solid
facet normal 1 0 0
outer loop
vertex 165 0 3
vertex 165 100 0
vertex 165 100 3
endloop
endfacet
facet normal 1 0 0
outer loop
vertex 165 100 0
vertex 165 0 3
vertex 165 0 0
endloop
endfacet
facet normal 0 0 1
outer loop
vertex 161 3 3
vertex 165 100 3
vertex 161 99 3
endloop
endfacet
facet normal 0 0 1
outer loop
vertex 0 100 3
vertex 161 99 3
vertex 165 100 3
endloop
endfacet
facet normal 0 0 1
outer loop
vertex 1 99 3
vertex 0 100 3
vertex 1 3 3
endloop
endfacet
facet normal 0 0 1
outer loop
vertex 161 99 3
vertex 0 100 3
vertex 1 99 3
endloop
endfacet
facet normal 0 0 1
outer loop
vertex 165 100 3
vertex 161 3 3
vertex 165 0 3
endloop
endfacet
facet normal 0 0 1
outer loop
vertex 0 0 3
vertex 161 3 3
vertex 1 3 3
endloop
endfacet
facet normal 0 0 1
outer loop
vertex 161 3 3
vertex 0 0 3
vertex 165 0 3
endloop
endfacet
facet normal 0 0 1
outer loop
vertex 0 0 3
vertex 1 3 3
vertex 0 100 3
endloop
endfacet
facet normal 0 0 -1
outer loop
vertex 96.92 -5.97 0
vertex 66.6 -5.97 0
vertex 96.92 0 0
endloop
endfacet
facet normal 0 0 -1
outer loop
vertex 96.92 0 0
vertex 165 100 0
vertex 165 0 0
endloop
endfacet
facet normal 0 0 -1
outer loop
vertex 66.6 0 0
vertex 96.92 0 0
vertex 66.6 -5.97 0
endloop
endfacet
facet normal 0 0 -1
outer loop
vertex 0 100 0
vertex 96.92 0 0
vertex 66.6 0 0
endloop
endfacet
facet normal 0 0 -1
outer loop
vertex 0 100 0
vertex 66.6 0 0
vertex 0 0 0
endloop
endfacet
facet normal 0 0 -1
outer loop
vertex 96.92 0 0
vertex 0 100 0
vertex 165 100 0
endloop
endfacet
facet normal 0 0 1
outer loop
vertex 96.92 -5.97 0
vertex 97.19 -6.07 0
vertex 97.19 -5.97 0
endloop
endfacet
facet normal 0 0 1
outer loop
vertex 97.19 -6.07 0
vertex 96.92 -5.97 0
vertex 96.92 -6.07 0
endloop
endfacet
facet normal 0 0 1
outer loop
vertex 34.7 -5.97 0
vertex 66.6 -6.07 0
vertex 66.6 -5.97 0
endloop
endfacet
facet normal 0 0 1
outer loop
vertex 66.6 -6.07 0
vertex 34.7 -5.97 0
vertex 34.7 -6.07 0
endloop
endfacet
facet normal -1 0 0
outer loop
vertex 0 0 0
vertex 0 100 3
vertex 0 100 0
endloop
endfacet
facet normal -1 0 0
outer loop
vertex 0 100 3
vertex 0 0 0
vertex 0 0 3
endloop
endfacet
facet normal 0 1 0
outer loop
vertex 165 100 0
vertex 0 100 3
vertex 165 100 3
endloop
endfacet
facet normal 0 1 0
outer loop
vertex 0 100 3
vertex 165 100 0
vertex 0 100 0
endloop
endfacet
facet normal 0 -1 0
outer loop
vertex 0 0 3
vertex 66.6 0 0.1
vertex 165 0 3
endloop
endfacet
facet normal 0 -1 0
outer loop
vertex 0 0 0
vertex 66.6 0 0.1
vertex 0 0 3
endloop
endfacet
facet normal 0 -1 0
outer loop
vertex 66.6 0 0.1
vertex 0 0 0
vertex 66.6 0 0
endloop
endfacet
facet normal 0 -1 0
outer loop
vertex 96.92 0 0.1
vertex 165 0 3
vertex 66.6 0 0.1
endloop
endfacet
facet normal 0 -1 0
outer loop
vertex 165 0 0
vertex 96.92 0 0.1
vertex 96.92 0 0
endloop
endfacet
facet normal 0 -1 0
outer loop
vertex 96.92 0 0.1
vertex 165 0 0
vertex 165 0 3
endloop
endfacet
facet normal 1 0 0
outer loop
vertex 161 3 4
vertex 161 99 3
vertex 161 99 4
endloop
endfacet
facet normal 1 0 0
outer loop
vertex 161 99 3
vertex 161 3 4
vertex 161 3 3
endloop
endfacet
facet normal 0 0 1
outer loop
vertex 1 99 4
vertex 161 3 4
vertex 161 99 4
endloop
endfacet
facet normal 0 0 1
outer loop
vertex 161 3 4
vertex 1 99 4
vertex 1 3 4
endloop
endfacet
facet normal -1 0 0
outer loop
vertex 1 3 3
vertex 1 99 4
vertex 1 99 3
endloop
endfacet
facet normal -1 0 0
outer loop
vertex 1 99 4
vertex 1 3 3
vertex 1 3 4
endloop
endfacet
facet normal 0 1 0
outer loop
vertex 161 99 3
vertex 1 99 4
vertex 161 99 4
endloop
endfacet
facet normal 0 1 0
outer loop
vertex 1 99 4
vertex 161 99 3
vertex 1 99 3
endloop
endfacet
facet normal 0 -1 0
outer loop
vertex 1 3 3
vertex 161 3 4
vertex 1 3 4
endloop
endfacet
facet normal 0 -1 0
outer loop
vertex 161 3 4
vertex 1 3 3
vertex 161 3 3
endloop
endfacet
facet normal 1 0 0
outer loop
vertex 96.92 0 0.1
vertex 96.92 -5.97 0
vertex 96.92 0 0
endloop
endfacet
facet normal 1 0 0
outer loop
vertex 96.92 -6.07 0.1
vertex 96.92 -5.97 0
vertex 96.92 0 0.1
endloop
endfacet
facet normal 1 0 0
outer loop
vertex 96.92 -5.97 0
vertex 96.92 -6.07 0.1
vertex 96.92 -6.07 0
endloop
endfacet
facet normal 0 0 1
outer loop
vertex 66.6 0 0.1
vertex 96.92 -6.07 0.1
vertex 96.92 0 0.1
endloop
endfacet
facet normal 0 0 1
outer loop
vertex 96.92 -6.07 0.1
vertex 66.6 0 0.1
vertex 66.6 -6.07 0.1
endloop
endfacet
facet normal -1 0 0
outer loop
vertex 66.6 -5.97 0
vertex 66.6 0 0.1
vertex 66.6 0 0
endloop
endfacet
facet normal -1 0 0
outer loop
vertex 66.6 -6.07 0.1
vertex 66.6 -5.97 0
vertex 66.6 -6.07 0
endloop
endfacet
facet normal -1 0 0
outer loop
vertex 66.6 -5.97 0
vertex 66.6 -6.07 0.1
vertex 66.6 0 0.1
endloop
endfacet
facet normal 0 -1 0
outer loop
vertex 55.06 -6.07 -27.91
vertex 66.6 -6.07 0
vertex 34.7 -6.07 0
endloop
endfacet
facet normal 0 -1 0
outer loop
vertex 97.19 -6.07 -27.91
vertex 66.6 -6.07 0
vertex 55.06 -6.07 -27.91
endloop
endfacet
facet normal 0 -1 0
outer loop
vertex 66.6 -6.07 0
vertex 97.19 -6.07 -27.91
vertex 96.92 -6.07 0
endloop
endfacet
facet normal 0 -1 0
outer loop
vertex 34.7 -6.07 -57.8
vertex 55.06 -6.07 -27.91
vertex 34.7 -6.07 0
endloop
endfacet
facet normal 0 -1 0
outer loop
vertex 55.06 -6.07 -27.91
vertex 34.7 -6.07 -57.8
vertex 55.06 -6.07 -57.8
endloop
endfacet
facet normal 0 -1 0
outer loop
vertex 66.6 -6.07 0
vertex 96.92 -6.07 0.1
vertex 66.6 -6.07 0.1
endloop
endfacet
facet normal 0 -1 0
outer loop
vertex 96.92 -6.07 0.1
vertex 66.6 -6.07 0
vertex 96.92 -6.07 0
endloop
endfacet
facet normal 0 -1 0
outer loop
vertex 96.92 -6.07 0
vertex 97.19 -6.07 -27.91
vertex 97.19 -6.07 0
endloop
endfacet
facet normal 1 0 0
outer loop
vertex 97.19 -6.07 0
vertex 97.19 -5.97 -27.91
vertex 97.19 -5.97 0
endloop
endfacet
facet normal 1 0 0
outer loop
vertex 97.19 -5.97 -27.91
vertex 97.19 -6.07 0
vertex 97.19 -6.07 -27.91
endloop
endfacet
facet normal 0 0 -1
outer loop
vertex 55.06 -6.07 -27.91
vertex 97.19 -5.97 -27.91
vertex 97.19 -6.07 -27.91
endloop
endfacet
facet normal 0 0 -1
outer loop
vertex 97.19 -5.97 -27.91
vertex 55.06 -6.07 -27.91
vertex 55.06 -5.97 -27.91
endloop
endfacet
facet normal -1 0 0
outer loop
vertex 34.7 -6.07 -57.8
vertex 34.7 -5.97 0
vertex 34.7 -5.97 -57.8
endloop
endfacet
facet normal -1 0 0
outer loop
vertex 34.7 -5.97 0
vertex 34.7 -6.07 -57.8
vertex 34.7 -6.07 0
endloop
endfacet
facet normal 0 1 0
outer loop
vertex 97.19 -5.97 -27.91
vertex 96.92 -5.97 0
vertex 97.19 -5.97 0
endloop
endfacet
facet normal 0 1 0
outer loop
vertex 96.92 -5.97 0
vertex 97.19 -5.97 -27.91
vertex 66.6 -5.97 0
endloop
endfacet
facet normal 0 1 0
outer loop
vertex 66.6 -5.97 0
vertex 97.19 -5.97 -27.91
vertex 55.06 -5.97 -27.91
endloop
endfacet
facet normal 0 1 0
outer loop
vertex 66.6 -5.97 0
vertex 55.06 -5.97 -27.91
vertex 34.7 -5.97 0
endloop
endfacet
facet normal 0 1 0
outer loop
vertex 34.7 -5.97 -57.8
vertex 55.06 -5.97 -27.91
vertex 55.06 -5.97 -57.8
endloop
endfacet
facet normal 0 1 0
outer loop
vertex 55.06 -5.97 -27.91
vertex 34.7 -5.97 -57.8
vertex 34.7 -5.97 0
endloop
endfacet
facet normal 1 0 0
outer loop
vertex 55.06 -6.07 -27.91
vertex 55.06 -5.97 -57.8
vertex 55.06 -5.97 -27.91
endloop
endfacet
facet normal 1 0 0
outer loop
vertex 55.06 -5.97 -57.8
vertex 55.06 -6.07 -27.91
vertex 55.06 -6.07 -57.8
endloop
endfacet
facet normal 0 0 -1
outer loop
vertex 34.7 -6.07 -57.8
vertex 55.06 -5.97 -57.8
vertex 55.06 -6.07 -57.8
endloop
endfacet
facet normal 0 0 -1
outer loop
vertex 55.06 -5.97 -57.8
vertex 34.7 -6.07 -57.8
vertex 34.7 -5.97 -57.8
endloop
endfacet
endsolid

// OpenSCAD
//
// 7 inch diagonal LCD panel
// AdaFruit item # 2354
//
module bbs_lcd7()
{
    union()
    {
        cube([165, 100, 3]);
        translate([1, 3, 3]) cube([160, 96, 1]);
        translate([66.6, -6.07, 0]) cube([30.32, 6.07, 0.1]);
        translate([34.7, -6.07, -27.91]) cube([62.49, 0.1, 27.91]);
        translate([34.7, -6.07, -57.8]) cube([20.36, 0.1, 29.97]);
    }
}

bbs_lcd7();
